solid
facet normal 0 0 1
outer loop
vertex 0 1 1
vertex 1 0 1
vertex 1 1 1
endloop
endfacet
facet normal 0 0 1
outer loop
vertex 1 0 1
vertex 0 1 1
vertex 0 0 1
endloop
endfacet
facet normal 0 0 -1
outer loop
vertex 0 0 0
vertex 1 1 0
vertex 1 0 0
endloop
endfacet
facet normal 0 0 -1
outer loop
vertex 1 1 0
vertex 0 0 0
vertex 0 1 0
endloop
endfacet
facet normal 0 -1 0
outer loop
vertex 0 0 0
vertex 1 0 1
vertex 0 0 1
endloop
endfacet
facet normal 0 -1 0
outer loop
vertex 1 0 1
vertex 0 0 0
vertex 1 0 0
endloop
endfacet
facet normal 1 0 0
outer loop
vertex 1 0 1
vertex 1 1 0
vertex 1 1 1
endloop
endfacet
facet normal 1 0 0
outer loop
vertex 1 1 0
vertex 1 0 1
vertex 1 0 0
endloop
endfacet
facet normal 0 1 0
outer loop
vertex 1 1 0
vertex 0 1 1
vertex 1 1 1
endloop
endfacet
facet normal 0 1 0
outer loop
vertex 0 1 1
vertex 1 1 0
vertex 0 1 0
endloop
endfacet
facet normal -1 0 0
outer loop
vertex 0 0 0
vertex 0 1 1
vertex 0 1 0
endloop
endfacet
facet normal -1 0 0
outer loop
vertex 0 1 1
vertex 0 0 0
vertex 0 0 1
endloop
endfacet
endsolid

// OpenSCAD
cube(1);
echo([100:10:1000]);
echo([100:1000]);

start = 1;
steps = 10;
end = steps * 100;
echo([start: steps: end]);

// The three-part version is NOT DEPRECATED
echo([100 : 5 : 1]);


/* This start > end is DEPRECATED, but make sure we handle it anyways. */
echo([100:1]);
